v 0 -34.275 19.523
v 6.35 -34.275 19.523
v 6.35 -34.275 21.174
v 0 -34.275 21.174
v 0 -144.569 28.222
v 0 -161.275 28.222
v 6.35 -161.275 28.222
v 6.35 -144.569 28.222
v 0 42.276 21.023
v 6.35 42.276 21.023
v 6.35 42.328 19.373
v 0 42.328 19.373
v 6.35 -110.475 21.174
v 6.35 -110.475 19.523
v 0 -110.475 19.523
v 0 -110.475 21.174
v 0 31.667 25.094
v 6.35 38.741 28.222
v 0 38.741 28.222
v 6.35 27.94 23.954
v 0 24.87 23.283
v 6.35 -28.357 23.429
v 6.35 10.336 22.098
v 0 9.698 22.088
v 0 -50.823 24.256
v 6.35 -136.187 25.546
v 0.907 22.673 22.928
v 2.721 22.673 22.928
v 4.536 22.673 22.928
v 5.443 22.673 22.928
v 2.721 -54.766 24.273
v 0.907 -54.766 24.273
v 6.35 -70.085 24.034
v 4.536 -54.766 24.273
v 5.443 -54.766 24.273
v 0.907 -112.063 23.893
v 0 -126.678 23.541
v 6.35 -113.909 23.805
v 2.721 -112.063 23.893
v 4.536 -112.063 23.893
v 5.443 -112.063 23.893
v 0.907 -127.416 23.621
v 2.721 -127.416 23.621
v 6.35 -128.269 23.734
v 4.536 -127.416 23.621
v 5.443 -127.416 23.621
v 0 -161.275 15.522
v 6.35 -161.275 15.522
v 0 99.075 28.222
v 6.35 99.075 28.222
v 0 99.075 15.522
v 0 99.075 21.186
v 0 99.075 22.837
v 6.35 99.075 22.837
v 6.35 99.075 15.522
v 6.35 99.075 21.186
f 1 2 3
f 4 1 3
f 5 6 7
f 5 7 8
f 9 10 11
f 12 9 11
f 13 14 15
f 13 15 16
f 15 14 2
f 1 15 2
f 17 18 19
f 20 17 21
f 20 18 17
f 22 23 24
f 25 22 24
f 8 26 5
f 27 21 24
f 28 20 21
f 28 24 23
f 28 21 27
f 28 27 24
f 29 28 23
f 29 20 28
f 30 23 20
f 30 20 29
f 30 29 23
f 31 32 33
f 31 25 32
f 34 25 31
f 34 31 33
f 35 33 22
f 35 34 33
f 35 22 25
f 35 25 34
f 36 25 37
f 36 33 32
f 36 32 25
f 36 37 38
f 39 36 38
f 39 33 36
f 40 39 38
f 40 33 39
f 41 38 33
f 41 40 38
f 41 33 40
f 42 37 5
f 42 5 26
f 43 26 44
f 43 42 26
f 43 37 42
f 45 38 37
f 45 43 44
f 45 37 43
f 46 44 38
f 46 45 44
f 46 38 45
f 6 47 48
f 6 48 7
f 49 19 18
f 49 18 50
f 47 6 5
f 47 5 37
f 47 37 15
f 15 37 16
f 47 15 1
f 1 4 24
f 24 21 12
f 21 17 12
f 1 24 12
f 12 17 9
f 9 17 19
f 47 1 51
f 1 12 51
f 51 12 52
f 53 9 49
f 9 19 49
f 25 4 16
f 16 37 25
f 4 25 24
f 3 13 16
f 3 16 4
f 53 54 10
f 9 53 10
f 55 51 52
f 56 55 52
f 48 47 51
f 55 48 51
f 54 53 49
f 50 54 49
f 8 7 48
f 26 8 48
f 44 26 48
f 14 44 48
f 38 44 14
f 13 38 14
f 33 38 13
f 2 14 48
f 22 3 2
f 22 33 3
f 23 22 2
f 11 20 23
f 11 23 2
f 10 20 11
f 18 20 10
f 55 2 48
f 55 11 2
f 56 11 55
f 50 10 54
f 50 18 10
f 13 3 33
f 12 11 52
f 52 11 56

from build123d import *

# Parameters (mm, degrees)
F0_W     = 260.35
F0_H     = 12.7
F1_DEPTH = 6.35
F3_DEPTH = 25.4
F4_W     = 76.2
F4_H     = 1.651
F5_DEPTH = 25.4
F7_DEPTH = 25.4


with BuildPart() as f1:
    # F0 (on Right) → F1 (new body)
    with BuildSketch(Plane.YZ):
        with Locations((-31.1001208002, 21.8715034425)):
            Rectangle(F0_W, F0_H)
    extrude(amount=F1_DEPTH)

    # F2 (on face) → F3 (cut)
    with BuildSketch(Plane.YZ.offset(6.35)):
        Polygon((99.0748791998, 21.1856181787), (99.0748791998, 22.837460041), (42.2756113112, 21.0233647376), (42.3283152459, 19.3732061709), align=None)
    extrude(amount=-F3_DEPTH, mode=Mode.SUBTRACT)

    # F4 (on face) → F5 (cut)
    with BuildSketch(Plane.YZ.offset(6.35)):
        with Locations((-72.3751208002, 20.3488284017)):
            Rectangle(F4_W, F4_H)
    extrude(amount=-F5_DEPTH, mode=Mode.SUBTRACT)

    # F6 (on face) → F7 (cut)
    with BuildSketch(Plane.YZ.offset(6.35)):
        with BuildLine():
            add(Edge.make_bspline(
                [(38.7411899865, 28.2215034425), (34.4196630123, 26.0953657207), (22.6351323578, 20.2975226646), (-28.3812441061, 23.6166453568), (-54.3466635925, 24.5561071775), (-77.5025200152, 23.6378317044), (-112.0202918606, 24.5180769569), (-127.1029891925, 22.3998170636), (-138.6074726059, 26.2345090709), (-144.5686668158, 28.2215034425)],
                knots=[0, 0, 0, 0, 0.1168440117, 0.3186262276, 0.4662399176, 0.6031622473, 0.7689686463, 0.8802881695, 1, 1, 1, 1], degree=3))
            Line((38.7411899865, 28.2215034425), (-144.5686668158, 28.2215034425))
        make_face()
    extrude(amount=-F7_DEPTH, mode=Mode.SUBTRACT)


solid = f1.part
